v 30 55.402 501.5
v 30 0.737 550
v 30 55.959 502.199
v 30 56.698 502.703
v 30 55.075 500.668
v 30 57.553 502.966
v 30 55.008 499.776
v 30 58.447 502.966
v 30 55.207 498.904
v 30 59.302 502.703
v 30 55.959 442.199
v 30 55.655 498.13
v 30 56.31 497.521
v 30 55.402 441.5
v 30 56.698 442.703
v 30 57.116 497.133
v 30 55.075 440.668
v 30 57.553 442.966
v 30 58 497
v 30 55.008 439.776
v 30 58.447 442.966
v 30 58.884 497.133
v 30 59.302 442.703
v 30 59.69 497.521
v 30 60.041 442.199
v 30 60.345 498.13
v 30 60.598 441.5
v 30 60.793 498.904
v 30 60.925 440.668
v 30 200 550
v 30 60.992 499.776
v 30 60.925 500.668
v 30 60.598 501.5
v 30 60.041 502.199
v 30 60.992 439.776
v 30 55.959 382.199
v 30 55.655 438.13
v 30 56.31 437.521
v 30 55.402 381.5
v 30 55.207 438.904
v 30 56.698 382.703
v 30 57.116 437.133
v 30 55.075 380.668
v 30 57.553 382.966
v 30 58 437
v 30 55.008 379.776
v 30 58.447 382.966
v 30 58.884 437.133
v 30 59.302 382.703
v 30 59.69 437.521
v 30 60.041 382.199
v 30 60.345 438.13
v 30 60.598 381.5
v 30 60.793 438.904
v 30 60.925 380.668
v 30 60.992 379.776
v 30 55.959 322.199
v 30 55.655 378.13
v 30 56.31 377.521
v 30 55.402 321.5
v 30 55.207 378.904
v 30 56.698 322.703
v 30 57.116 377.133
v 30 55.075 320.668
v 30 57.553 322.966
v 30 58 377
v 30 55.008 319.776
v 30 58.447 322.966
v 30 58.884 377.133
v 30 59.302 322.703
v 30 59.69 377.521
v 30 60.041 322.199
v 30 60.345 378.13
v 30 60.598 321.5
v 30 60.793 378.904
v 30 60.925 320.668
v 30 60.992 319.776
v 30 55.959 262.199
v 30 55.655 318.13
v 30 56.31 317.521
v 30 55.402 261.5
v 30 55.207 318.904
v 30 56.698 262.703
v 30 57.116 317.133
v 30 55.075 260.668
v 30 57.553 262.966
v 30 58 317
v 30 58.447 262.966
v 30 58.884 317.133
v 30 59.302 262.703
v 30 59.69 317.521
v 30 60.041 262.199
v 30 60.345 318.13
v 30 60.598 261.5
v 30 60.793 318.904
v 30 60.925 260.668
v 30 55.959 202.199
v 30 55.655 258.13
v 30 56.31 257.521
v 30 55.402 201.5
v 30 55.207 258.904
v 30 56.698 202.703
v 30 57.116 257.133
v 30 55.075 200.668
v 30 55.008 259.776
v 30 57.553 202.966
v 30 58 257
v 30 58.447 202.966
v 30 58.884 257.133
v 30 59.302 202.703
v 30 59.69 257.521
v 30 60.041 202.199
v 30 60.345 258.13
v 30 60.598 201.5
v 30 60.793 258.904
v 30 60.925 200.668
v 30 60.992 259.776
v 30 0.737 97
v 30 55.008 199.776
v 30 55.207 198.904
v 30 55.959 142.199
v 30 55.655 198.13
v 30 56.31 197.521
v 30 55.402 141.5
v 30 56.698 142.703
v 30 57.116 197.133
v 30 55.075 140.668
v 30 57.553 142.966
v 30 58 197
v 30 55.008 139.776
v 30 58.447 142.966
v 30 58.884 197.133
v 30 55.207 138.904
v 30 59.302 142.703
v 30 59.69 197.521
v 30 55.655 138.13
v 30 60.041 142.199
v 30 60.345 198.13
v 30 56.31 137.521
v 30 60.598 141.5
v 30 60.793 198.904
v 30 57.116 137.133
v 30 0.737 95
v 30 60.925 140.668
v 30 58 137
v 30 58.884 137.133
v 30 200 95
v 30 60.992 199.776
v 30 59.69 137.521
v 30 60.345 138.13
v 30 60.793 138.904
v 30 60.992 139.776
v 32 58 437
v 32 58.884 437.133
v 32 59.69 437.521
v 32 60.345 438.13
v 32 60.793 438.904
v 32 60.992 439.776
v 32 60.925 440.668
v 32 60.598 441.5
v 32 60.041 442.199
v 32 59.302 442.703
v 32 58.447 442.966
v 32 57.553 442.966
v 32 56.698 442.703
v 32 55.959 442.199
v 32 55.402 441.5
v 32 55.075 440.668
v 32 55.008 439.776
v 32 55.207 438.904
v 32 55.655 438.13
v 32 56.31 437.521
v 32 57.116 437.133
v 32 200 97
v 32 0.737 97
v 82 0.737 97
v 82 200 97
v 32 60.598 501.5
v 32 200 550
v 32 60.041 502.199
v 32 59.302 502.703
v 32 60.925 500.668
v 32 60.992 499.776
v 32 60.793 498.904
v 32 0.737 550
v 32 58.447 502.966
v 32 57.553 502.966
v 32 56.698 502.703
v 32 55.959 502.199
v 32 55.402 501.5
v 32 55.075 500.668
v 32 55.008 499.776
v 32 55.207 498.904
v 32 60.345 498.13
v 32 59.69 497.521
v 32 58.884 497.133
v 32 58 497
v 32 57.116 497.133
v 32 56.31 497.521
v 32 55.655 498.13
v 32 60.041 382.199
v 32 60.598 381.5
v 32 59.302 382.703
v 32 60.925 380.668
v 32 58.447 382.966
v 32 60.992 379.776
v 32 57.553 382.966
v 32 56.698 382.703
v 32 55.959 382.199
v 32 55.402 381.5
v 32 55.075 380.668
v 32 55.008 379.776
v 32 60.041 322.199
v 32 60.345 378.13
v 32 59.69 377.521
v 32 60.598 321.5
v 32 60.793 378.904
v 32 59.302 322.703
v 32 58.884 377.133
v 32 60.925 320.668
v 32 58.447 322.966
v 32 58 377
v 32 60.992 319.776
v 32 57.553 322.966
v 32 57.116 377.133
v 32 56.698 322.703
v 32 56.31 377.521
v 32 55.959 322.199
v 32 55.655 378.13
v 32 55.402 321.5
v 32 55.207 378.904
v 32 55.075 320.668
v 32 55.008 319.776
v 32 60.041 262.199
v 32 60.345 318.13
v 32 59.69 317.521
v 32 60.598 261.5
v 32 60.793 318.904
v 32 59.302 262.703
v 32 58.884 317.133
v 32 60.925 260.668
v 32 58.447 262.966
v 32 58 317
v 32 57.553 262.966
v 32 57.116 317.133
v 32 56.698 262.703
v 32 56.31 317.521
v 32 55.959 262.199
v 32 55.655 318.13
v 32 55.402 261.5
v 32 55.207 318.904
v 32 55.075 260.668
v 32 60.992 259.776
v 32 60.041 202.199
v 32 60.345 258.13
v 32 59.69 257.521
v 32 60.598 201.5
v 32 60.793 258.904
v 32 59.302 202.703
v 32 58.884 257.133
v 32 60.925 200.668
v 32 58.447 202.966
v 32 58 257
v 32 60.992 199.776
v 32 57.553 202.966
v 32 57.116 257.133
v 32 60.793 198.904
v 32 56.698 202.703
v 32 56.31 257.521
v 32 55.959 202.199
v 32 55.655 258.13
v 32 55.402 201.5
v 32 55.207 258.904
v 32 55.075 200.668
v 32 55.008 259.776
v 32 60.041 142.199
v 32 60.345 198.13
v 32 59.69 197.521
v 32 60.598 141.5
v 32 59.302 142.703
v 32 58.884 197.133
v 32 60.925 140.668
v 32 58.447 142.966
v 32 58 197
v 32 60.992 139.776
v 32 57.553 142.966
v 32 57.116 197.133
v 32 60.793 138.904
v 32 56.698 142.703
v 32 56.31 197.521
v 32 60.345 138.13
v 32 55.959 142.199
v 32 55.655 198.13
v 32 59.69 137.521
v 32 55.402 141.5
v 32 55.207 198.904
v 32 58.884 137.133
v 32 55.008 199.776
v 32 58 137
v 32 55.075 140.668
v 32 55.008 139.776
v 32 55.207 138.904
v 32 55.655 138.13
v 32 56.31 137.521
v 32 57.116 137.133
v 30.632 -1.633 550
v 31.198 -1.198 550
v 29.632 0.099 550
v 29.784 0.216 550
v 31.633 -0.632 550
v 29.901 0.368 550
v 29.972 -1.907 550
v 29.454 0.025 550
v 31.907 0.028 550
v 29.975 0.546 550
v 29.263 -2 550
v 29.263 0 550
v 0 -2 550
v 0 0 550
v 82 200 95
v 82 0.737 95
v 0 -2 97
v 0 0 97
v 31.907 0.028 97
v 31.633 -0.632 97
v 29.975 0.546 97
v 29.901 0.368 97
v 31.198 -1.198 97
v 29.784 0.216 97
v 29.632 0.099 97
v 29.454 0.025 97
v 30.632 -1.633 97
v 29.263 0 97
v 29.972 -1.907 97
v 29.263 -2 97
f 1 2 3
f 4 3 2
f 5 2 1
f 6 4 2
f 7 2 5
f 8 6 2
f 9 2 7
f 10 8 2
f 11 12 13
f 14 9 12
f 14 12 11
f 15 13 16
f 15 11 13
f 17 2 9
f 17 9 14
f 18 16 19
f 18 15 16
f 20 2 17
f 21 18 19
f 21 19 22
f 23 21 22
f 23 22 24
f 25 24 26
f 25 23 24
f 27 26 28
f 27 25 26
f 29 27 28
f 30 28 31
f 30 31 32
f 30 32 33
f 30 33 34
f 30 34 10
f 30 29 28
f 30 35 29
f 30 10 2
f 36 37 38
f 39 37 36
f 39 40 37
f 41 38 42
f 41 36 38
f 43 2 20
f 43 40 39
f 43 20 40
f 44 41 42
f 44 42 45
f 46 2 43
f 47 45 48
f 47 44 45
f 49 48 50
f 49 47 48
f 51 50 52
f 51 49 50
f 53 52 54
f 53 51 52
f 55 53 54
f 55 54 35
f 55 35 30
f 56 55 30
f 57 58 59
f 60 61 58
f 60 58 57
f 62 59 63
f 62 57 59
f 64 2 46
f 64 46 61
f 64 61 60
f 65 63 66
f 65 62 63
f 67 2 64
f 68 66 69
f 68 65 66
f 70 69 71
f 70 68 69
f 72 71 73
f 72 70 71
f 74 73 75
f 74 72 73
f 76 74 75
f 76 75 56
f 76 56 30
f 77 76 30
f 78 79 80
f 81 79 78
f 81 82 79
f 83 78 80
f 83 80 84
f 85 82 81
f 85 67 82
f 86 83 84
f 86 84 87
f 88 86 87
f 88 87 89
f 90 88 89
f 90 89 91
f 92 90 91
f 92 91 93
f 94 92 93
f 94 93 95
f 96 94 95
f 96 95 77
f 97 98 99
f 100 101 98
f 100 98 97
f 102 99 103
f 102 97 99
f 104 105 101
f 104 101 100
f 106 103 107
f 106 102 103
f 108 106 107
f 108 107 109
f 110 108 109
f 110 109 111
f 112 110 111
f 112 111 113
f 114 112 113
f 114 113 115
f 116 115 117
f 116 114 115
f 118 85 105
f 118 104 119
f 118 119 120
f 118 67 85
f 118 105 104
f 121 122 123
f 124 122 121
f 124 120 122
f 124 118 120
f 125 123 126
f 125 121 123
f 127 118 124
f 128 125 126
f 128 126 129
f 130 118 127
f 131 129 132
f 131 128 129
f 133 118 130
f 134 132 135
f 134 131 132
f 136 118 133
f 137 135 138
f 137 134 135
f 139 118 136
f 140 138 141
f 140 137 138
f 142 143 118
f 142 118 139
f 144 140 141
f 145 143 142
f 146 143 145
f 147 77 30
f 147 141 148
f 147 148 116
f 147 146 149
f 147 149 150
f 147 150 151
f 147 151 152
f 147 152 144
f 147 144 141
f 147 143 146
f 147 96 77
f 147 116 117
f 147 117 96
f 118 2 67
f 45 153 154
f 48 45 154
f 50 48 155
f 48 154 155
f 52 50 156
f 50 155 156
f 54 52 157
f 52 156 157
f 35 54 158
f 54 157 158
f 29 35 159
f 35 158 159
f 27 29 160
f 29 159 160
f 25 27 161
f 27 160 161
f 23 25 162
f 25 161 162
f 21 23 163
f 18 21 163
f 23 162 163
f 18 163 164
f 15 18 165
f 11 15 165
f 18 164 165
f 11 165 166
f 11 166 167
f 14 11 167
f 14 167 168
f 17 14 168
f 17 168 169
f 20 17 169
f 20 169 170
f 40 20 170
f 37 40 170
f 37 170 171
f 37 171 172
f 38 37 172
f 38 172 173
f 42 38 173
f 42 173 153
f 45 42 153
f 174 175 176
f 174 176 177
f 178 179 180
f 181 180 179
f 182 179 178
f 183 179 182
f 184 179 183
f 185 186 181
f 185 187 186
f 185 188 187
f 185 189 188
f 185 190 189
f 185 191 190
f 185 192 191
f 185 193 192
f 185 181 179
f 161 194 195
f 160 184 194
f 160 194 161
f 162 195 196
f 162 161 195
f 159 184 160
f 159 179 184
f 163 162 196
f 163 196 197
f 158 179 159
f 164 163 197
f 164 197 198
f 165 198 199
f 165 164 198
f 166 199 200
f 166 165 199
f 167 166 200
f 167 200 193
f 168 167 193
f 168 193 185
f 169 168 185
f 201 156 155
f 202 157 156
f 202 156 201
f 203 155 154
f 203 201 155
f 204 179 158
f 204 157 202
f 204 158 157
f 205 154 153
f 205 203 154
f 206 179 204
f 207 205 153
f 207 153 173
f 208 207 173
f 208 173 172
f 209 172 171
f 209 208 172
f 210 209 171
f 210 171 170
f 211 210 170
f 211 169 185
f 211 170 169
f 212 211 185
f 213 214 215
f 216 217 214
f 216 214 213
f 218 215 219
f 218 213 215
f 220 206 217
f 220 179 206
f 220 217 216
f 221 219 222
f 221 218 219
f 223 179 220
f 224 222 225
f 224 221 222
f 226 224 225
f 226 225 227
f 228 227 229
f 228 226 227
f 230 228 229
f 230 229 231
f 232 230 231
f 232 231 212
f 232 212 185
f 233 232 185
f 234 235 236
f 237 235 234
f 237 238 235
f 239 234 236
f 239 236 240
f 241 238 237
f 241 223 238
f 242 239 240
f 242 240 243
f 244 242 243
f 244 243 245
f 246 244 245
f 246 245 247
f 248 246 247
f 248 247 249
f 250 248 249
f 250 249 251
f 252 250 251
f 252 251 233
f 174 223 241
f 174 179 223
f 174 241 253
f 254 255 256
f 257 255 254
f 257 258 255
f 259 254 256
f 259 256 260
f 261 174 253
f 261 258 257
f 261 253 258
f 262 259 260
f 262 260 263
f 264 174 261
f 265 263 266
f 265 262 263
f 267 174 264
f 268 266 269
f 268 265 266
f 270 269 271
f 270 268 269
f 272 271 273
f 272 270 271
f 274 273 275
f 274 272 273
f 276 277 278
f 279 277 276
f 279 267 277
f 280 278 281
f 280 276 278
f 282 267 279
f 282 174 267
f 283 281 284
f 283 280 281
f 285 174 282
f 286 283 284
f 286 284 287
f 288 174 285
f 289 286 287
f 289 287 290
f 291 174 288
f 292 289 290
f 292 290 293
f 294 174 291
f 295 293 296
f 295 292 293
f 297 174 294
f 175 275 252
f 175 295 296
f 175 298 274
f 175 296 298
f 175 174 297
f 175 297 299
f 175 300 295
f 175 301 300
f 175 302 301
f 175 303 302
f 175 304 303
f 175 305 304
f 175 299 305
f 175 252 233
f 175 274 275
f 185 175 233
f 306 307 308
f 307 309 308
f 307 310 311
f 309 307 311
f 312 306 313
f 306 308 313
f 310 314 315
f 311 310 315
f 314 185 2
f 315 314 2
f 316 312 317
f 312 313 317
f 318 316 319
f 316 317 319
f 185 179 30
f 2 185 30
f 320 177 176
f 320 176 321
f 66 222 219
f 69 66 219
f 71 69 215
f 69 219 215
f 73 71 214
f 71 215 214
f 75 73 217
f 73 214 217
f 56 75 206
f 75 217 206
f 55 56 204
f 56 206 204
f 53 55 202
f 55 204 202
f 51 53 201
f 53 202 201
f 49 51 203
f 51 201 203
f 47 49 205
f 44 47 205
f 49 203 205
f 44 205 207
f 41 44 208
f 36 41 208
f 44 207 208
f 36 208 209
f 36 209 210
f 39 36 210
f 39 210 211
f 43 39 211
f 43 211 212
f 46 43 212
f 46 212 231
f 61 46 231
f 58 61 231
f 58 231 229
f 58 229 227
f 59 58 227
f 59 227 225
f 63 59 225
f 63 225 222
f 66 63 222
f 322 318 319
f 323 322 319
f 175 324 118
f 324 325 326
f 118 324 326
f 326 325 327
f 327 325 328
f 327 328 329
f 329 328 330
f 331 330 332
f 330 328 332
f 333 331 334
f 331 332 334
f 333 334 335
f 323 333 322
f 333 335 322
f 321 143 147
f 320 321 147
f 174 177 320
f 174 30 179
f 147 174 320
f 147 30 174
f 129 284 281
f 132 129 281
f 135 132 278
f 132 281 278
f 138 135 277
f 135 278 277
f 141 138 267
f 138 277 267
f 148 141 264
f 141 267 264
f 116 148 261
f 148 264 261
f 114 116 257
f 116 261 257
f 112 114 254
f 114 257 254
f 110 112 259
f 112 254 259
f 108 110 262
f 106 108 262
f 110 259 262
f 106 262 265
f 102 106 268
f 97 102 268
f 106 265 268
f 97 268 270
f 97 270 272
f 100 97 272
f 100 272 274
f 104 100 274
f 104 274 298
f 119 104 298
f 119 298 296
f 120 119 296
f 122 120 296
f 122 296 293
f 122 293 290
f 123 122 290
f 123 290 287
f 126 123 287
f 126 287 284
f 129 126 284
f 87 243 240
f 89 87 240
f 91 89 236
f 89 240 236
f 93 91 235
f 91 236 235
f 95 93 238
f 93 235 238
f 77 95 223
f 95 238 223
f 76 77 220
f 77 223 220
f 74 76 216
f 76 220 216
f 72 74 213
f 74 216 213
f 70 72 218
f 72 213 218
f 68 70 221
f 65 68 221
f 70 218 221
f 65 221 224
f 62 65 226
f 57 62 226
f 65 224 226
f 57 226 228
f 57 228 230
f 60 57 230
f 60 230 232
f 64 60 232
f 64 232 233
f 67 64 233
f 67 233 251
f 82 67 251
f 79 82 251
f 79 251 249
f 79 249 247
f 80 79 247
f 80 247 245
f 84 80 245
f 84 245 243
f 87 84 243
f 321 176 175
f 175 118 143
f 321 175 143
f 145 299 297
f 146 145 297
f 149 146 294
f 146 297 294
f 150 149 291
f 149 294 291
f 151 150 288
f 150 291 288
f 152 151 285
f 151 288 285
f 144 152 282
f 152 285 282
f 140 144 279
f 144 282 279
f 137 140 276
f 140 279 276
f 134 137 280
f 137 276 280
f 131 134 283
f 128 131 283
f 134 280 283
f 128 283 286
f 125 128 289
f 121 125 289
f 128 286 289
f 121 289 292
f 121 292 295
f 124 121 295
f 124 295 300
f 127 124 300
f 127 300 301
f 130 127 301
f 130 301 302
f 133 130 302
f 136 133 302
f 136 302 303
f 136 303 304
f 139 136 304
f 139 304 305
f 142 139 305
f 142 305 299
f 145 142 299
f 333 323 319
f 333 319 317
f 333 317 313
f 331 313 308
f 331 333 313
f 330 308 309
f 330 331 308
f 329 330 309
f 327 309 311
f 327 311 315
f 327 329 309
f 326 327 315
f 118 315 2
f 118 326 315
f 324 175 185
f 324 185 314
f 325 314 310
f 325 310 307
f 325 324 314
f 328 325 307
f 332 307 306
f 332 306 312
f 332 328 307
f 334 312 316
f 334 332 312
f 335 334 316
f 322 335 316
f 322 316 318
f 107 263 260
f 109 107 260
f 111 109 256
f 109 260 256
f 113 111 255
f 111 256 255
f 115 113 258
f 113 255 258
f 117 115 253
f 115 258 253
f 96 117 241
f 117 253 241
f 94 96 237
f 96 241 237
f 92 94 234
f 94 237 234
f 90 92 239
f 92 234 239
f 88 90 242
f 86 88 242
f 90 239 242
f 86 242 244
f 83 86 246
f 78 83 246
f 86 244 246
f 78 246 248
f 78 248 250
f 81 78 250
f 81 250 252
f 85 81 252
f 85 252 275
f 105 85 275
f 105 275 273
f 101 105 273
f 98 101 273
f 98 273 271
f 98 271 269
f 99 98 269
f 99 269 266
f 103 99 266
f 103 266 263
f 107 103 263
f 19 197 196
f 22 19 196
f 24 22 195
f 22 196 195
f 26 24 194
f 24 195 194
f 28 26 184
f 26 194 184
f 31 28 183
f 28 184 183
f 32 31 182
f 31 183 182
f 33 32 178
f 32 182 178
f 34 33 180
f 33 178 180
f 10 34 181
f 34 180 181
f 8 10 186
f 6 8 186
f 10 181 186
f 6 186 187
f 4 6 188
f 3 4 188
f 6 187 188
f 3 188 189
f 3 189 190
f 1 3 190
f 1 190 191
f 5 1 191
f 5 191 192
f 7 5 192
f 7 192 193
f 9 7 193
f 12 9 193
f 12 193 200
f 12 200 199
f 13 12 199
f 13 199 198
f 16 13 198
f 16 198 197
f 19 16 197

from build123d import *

# Parameters (mm, degrees)
BASE_FLANGE1_DEPTH      = 550
SKETCH10_R              = 3
CUT_EXTRUDE2_DEPTH      = 10
CUT_EXTRUDE3_DEPTH      = 587.003412959
CUT_EXTRUDE3_DEPTH_BACK = 587.003412959
SKETCH15_W              = 2
SKETCH15_H              = 199.2634
BOSS_EXTRUDE2_DEPTH     = 50
SKETCH16_W              = 32
SKETCH16_H              = 2
CUT_EXTRUDE4_DEPTH      = 2.7366


# Sheet-metal steps are written as plain solids
with BuildPart() as part:
    # Sketch1 → Base-Flange1 (new body)
    with BuildSketch(Plane.XY):
        with BuildLine():
            Line((0, 0), (29.2634, 0))
            ThreePointArc((29.2634, 0), (29.784254855, 0.215745145), (30, 0.7366))
            Line((30, 0.7366), (30, 200))
            Line((30, 200), (32, 200))
            Line((32, 200), (32, 0.7366))
            ThreePointArc((32, 0.7366), (31.198468417, -1.198468417), (29.2634, -2))
            Line((29.2634, -2), (0, -2))
            Line((0, -2), (0, 0))
        make_face()
    extrude(amount=BASE_FLANGE1_DEPTH)

    # Sketch10 → Cut-Extrude2 (cut)
    with BuildSketch(Plane(origin=(32, 0, 0), x_dir=(0, 0, -1), z_dir=(1, 0, 0))):
        with Locations((-500, 58)):
            Circle(SKETCH10_R)
        with Locations((-440, 58)):
            Circle(SKETCH10_R)
        with Locations((-380, 58)):
            Circle(SKETCH10_R)
        with Locations((-320, 58)):
            Circle(SKETCH10_R)
        with Locations((-260, 58)):
            Circle(SKETCH10_R)
        with Locations((-200, 58)):
            Circle(SKETCH10_R)
        with Locations((-140, 58)):
            Circle(SKETCH10_R)
    extrude(amount=-CUT_EXTRUDE2_DEPTH, mode=Mode.SUBTRACT)

    # Sketch11 → Cut-Extrude3 (cut, two sides: drawn at the far end of the back side and taken through both)
    with BuildSketch(Plane.ZY.offset(-30).offset(-CUT_EXTRUDE3_DEPTH_BACK)):
        Polygon((0, 200), (95, 200), (95, 0.7366), (95, -11.499359117), (0, -11.499359117), (0, 0.7366), align=None)
    extrude(amount=CUT_EXTRUDE3_DEPTH + CUT_EXTRUDE3_DEPTH_BACK, mode=Mode.SUBTRACT)

    # Sketch15 → Boss-Extrude2 (add)
    with BuildSketch(Plane(origin=(32, 0, 0), x_dir=(0, 0, -1), z_dir=(1, 0, 0))):
        with Locations((-96, 100.3683)):
            Rectangle(SKETCH15_W, SKETCH15_H)
    extrude(amount=BOSS_EXTRUDE2_DEPTH)

    # Sketch16 → Cut-Extrude4 (cut)
    with BuildSketch(Plane(origin=(0, -2, 0), x_dir=(-1, 0, 0), z_dir=(0, -1, 0))):
        with Locations((-16, -96)):
            Rectangle(SKETCH16_W, SKETCH16_H)
    extrude(amount=-CUT_EXTRUDE4_DEPTH, mode=Mode.SUBTRACT)


solid = part.part
